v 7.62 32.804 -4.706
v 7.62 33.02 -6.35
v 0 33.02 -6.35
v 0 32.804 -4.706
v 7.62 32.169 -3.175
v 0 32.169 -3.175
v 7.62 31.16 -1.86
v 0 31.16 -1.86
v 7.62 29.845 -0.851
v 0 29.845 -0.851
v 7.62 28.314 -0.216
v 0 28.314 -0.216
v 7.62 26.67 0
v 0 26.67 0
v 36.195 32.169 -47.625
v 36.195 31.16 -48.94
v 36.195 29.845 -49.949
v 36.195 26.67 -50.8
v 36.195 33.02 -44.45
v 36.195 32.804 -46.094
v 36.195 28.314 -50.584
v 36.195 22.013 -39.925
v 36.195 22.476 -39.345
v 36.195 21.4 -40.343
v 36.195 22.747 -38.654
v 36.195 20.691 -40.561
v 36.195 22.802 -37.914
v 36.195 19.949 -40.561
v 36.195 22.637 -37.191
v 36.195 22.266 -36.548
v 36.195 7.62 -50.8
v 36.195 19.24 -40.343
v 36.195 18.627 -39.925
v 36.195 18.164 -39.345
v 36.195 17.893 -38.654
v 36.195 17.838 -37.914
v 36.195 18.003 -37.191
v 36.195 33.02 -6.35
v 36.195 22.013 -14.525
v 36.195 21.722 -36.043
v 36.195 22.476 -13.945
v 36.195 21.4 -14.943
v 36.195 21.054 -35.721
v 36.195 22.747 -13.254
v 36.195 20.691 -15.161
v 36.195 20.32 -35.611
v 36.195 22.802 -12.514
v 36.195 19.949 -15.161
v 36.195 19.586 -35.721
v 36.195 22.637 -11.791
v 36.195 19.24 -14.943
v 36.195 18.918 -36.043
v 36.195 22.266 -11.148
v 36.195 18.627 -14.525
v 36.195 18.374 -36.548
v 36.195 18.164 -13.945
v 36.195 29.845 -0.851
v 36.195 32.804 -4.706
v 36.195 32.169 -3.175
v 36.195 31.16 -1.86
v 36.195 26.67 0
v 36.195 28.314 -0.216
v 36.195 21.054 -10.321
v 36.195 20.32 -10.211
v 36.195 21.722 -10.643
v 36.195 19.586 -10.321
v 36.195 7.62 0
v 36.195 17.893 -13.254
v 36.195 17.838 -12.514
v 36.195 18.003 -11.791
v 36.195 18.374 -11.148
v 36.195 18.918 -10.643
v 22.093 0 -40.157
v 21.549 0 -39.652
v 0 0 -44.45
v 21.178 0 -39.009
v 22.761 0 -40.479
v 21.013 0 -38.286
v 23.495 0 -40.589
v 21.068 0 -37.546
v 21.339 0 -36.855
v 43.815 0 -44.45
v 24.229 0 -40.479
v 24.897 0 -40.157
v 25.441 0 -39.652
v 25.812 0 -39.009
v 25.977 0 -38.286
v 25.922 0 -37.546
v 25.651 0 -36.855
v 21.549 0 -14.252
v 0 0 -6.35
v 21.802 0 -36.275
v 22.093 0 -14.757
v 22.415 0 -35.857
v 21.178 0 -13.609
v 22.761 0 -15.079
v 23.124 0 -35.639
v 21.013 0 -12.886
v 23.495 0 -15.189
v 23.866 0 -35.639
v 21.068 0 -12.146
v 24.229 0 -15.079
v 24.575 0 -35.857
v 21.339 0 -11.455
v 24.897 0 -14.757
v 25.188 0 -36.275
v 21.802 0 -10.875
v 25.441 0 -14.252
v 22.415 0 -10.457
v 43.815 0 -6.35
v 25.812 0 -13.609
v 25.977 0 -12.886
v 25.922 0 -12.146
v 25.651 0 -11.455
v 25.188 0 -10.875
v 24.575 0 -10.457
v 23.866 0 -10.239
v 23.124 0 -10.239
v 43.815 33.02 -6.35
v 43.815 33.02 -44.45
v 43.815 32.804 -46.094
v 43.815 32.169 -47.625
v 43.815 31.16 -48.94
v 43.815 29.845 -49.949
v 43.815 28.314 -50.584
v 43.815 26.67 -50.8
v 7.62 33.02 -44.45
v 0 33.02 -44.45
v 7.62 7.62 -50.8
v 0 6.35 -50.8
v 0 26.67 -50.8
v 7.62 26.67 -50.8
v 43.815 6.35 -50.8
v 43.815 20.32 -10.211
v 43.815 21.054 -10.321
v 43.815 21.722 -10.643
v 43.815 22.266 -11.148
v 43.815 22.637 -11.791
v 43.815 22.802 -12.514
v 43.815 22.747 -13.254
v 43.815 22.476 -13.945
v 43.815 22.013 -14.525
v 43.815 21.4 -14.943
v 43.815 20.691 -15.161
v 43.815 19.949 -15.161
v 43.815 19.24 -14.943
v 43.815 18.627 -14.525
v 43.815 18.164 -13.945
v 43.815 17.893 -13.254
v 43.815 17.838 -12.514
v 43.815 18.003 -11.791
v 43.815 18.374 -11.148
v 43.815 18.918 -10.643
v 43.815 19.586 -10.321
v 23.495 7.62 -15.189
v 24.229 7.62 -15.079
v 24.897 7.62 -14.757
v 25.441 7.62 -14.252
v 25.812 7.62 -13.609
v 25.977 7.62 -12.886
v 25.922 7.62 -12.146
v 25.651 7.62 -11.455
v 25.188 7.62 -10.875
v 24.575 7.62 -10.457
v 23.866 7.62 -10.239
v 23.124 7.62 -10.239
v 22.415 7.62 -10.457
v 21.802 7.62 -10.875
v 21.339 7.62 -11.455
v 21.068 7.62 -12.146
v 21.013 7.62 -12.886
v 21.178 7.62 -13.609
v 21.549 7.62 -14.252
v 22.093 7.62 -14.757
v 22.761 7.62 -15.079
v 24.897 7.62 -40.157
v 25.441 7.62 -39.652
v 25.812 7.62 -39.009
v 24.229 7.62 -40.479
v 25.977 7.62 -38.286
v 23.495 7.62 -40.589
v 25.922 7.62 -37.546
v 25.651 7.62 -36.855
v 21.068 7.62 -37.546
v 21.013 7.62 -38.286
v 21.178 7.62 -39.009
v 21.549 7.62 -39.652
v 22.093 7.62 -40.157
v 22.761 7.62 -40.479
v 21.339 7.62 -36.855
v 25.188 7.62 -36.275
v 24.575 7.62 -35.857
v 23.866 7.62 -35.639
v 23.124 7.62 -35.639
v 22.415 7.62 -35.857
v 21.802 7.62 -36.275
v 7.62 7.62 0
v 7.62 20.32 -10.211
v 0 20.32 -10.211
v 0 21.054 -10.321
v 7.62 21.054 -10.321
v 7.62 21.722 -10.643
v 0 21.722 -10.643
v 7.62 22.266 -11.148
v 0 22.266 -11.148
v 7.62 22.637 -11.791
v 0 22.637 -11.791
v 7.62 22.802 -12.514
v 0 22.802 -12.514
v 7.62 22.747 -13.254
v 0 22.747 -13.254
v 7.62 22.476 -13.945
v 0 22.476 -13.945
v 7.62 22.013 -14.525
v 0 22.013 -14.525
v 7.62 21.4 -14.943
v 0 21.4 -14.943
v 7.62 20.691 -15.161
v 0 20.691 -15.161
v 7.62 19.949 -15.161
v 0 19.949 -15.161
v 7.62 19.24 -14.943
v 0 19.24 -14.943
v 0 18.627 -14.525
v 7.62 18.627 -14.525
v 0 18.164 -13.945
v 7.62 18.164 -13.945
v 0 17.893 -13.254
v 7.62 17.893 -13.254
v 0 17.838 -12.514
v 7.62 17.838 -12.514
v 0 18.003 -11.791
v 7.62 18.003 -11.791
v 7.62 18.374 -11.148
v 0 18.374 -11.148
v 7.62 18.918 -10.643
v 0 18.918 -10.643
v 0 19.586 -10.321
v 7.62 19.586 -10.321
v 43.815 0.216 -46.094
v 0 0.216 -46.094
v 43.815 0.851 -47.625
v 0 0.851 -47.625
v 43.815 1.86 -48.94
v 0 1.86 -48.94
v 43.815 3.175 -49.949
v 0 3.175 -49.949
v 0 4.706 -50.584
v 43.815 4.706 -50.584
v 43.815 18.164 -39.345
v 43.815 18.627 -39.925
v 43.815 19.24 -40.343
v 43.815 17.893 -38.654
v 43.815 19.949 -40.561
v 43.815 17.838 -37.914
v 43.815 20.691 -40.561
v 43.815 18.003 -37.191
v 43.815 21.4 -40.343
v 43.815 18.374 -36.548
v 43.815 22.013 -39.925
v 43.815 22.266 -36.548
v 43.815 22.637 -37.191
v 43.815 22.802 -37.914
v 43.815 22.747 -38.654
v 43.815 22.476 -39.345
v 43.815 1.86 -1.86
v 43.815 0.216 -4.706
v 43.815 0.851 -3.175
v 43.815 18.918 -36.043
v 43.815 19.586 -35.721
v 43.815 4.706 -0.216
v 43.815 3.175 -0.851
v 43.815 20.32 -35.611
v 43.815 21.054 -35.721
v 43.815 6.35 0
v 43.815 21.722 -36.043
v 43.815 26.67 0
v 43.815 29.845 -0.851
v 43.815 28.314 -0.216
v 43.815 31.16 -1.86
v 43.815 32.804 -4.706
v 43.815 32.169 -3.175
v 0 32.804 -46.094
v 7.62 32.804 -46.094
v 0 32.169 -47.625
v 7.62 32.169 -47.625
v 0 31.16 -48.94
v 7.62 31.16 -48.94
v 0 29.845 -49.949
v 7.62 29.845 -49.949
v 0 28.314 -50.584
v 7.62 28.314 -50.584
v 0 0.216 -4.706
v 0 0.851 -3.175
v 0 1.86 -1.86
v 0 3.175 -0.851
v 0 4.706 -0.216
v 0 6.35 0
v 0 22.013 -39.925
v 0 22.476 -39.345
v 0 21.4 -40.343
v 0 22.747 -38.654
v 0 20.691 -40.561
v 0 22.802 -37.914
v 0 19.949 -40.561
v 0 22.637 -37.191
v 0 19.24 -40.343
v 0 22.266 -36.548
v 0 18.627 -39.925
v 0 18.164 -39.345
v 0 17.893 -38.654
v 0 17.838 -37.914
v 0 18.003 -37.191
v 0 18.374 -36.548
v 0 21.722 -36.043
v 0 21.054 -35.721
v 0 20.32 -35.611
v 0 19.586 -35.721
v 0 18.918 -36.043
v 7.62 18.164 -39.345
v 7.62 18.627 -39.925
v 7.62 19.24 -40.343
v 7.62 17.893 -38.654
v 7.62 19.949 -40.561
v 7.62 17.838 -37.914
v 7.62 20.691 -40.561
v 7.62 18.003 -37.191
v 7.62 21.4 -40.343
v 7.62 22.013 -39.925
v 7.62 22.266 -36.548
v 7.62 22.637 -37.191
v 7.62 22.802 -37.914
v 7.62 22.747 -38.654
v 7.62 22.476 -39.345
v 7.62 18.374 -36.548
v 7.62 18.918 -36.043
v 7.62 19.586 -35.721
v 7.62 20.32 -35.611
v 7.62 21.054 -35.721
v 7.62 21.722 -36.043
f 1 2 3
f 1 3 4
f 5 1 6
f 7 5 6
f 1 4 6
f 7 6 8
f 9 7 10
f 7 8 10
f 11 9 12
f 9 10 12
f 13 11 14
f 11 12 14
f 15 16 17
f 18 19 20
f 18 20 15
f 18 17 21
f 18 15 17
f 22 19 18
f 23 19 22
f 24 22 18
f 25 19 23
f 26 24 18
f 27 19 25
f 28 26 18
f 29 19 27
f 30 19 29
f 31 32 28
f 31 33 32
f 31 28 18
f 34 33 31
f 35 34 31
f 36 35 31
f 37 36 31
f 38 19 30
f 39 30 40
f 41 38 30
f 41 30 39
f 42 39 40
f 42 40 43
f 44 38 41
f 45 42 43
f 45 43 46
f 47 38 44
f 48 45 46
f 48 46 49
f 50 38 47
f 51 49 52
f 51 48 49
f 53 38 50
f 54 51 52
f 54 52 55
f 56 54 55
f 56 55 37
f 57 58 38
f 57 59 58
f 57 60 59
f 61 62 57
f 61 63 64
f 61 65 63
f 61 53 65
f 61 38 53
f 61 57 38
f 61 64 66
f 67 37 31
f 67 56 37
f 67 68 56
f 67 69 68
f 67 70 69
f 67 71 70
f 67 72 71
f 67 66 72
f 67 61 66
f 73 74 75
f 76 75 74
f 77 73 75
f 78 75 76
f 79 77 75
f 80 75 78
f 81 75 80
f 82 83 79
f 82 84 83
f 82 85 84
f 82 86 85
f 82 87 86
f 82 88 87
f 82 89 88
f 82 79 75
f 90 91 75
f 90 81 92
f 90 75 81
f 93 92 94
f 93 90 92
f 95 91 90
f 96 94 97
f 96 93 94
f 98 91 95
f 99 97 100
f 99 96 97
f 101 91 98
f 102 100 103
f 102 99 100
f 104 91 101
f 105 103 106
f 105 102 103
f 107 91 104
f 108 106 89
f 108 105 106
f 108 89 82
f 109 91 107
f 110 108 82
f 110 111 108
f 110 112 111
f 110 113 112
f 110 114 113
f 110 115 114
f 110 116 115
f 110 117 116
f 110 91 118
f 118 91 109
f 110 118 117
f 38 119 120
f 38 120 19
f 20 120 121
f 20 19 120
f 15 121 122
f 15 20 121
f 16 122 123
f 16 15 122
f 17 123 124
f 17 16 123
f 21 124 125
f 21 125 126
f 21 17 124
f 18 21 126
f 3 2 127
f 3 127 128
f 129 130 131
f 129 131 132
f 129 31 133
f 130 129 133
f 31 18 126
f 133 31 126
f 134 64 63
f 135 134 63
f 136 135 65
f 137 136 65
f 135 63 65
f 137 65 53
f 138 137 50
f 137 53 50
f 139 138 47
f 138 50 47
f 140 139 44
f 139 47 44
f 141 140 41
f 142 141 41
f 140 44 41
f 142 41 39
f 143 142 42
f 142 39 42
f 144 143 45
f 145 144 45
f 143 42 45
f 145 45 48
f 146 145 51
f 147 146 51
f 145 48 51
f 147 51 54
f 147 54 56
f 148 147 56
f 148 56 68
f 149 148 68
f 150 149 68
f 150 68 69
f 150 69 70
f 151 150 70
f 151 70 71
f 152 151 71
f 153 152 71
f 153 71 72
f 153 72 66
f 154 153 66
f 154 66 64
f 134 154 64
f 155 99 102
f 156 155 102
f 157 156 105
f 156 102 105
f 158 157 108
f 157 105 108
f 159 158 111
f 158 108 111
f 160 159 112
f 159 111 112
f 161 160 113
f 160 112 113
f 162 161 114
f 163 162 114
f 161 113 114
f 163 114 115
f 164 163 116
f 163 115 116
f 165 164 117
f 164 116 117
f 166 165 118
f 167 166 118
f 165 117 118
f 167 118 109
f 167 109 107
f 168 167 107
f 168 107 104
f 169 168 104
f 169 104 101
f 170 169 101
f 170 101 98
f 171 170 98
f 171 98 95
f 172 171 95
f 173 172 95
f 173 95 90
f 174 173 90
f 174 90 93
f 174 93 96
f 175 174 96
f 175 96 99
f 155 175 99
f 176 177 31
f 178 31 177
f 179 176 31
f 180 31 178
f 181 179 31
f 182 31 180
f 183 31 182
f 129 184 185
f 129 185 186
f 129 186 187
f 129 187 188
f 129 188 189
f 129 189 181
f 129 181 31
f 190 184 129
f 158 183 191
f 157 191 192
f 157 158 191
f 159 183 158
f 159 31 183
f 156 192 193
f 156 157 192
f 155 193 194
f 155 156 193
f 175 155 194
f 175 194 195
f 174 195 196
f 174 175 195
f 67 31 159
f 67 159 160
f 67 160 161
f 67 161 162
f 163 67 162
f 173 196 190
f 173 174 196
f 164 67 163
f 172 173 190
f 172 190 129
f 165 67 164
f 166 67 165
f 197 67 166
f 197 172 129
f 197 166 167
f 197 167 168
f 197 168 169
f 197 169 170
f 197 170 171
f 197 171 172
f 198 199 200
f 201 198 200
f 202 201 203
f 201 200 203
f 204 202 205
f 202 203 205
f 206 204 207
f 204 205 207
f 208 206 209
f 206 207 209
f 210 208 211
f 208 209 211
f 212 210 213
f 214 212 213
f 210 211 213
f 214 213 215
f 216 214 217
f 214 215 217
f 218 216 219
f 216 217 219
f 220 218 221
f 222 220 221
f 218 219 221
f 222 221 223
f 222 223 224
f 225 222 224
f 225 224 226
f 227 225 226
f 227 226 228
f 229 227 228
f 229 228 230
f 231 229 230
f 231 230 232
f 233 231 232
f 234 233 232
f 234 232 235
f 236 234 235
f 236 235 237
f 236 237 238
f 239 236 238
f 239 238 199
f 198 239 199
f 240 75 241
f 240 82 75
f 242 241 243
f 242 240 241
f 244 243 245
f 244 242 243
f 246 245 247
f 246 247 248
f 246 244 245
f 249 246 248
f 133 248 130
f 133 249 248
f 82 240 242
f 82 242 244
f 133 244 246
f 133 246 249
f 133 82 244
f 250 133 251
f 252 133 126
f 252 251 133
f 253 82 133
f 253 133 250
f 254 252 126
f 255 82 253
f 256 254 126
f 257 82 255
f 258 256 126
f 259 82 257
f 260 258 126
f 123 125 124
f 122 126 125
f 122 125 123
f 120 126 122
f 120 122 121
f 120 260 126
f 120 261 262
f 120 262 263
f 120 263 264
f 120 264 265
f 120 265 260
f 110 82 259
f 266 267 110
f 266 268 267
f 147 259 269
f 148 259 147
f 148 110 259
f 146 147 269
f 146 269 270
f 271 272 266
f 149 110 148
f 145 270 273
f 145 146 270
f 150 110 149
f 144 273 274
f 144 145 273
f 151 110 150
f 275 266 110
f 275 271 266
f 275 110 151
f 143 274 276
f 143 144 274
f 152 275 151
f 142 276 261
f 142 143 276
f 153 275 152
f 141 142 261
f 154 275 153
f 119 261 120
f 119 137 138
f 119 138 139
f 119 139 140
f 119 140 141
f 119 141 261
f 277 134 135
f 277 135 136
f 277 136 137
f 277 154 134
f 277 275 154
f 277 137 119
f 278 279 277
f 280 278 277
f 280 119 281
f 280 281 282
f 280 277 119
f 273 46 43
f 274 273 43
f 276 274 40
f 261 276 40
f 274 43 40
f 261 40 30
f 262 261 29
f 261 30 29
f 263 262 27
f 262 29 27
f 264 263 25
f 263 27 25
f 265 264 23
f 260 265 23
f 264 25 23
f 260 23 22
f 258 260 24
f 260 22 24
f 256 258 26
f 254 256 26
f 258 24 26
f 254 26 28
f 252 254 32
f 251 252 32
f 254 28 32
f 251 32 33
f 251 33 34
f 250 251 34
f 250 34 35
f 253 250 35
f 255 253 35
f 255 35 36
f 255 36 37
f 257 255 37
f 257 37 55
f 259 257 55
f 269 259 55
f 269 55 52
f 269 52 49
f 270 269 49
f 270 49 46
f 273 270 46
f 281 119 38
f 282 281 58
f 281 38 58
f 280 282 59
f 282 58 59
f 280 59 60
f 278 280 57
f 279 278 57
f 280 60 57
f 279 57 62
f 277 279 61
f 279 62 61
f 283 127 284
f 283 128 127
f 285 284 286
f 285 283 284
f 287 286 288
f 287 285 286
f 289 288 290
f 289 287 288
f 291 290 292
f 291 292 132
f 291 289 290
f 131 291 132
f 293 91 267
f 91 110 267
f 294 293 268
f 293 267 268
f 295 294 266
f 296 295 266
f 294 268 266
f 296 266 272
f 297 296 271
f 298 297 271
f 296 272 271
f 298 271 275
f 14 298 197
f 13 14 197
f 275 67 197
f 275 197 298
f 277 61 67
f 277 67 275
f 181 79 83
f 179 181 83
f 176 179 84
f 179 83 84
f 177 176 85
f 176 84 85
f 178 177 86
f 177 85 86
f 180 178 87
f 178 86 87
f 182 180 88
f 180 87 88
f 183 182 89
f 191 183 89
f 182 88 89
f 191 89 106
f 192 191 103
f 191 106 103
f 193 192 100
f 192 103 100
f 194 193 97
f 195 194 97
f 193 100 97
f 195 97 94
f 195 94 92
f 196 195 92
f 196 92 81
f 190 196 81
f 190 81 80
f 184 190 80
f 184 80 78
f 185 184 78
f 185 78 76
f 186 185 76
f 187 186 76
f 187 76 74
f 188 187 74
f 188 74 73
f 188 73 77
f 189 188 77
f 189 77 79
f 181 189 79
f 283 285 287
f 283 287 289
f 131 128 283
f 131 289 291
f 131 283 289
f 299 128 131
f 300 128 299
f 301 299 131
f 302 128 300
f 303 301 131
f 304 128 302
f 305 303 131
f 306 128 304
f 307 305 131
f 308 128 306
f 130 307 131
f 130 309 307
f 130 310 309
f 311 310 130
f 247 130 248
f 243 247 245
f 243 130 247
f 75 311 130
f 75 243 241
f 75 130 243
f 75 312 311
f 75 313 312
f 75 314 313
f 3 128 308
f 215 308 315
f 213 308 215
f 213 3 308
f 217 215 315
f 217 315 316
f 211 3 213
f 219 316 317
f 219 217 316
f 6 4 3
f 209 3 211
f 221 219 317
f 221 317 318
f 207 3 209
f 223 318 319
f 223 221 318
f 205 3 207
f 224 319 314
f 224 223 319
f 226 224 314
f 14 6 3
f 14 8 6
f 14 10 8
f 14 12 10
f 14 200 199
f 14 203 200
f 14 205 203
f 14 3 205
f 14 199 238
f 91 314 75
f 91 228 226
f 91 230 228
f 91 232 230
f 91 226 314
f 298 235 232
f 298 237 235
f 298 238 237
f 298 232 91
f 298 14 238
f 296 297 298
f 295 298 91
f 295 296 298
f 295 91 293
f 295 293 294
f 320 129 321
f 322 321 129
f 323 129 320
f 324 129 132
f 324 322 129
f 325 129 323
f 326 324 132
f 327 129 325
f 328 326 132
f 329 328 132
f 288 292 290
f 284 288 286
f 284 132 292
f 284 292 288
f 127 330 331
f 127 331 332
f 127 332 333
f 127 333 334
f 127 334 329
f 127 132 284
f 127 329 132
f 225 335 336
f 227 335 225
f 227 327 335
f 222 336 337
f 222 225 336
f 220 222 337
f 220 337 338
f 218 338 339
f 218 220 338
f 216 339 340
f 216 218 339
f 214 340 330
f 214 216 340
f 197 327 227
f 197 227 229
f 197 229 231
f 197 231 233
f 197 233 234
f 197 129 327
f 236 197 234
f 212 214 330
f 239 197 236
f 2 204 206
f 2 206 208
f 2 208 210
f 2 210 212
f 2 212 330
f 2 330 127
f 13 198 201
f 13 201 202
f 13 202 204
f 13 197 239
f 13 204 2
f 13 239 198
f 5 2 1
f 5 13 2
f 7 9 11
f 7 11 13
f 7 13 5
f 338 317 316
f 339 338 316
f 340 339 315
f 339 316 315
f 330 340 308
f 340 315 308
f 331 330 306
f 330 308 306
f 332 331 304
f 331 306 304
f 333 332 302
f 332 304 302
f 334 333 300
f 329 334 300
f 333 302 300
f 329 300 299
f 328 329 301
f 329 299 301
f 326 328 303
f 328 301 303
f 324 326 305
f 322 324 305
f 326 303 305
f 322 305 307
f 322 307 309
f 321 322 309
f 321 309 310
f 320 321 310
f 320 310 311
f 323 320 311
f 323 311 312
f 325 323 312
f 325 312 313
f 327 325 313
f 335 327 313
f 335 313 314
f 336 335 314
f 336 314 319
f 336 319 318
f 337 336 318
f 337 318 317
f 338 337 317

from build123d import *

# Parameters (mm, degrees)
BOSS_EXTRUDE1_DEPTH = 50.8
FILLET1_R           = 6.35
SKETCH2_R           = 2.4892
CUT_EXTRUDE1_DEPTH  = 75.771081475
SKETCH3_R           = 2.4892
CUT_EXTRUDE2_DEPTH  = 75.771081475


with BuildPart() as part:
    # Sketch1 → Boss-Extrude1 (new body)
    with BuildSketch(Plane.XY):
        Polygon((0, 33.02), (0, 0), (43.815, 0), (43.815, 33.02), (36.195, 33.02), (36.195, 7.62), (7.62, 7.62), (7.62, 33.02), align=None)
    extrude(amount=-BOSS_EXTRUDE1_DEPTH)

    # Fillet1
    fillet1_edges = [part.edges().sort_by_distance(p)[0] for p in [
        (21.9075, 0, 0),
        (3.81, 33.02, 0),
        (40.005, 33.02, 0),
        (3.81, 33.02, -50.8),
        (21.9075, 0, -50.8),
        (40.005, 33.02, -50.8),
    ]]
    fillet(fillet1_edges, radius=FILLET1_R)

    # Sketch2 → Cut-Extrude1 (cut, through all)
    with BuildSketch(Plane.ZY):
        with Locations((-38.1, 20.32)):
            Circle(SKETCH2_R)
        with Locations((-12.7, 20.32)):
            Circle(SKETCH2_R)
    extrude(amount=-CUT_EXTRUDE1_DEPTH, mode=Mode.SUBTRACT)

    # Sketch3 → Cut-Extrude2 (cut, through all)
    with BuildSketch(Plane.XZ):
        with Locations(Location((23.495, -38.1, 0), (0, 0, 270))):
            Circle(SKETCH3_R)
        with Locations(Location((23.495, -12.7, 0), (0, 0, 270))):
            Circle(SKETCH3_R)
    extrude(amount=-CUT_EXTRUDE2_DEPTH, mode=Mode.SUBTRACT)


solid = part.part
